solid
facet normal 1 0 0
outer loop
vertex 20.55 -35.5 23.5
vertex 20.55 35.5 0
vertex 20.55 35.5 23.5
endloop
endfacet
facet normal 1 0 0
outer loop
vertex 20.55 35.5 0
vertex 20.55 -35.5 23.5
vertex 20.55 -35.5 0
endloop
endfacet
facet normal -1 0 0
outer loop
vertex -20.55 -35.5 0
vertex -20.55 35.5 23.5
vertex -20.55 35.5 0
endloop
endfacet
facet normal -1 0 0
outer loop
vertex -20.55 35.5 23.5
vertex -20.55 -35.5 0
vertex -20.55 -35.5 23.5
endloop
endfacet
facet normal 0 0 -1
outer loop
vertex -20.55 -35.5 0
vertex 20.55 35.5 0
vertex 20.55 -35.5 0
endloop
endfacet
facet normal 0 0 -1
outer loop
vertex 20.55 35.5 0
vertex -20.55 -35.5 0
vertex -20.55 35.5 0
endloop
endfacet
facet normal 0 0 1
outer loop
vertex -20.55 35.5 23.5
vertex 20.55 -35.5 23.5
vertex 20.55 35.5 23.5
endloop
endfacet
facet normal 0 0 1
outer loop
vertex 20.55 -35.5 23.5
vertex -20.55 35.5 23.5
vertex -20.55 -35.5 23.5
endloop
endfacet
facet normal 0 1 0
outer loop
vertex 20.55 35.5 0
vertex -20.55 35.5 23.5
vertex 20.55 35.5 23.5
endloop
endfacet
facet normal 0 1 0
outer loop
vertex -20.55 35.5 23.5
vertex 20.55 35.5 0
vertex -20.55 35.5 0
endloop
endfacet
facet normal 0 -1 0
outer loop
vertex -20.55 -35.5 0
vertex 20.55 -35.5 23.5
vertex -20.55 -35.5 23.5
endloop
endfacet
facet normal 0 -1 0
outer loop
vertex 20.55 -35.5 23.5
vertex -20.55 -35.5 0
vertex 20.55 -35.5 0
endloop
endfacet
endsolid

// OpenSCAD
// file: values.scad
DEFAULT_ROUNDING = 24;
HIDEF_ROUNDING = 120;

SACRIFICIAL_BRIDGE_HEIGHT = .2;
BREAKAWAY_SUPPORT_DEPTH = .6;
BREAKAWAY_SUPPORT_GUTTER = 1;

PCB_WIDTH = 183.954;
PCB_LENGTH = 120.142;
PCB_HEIGHT = 1.6;
PCB_MOUNT_HOLE_DIAMETER = 3.2;

PCB_BATTERY_CAVITY_X = 135.382;
PCB_BATTERY_CAVITY_Y = 54.102;
PCB_BATTERY_CAVITY_LENGTH = PCB_LENGTH - PCB_BATTERY_CAVITY_Y + 1;

PCB_COMPONENTS_X = 2.54;
PCB_COMPONENTS_Y = 33.528;
PCB_COMPONENTS_WIDTH = PCB_BATTERY_CAVITY_X - PCB_COMPONENTS_X - 2.54 * 2;
PCB_COMPONENTS_LENGTH = PCB_LENGTH - PCB_COMPONENTS_Y - 2.54;
PCB_COMPONENTS_HEIGHT = 12;

PCB_SWITCH_X = 168.148;
PCB_SWITCH_Y = 9.148;

BUTTON_DIAMETER = 6;
BUTTON_LENGTH = 6.6;
BUTTON_WIDTH = 4.5;
BUTTON_HEIGHT = 6;

POT_HEIGHT = 7.8;

TOP_MOUNTED_PCB_HOLES = [
    [8.164, 3.048],
    [46.264, 3.048],
    [64.044, 3.048],
    [137.704, 3.048],
    [119.924, 3.048],
    [175.804, 3.048],
];

BOTTOM_MOUNTED_PCB_HOLES = [
    [8.164, 27.94],
    [64.044, 27.94],
    [175.804, 27.94],
    [119.924, 27.94],
];

BACK_PCB_HOLES = [
    [26.416, 98.298],
    [108.712, 98.298],
];

WIRE_RELIEF_HOLES = [
    [172.466, 50.038],
    [164.338, 50.038],
];

PCB_HOLES = concat(
    TOP_MOUNTED_PCB_HOLES,
    BOTTOM_MOUNTED_PCB_HOLES,
    BACK_PCB_HOLES,
    WIRE_RELIEF_HOLES
);

PCB_BUTTONS = [
    [10.414, 14.224 - BUTTON_LENGTH],
    [18.034, 19.304 - BUTTON_LENGTH],
    [25.654, 14.224 - BUTTON_LENGTH],
    [33.274, 19.304 - BUTTON_LENGTH],
    [40.894, 14.224 - BUTTON_LENGTH],
    [48.514, 19.304 - BUTTON_LENGTH],
    [56.134, 14.224 - BUTTON_LENGTH],
    [71.374, 14.224 - BUTTON_LENGTH],
    [78.994, 19.304 - BUTTON_LENGTH],
    [86.614, 14.224 - BUTTON_LENGTH],
    [94.234, 19.304 - BUTTON_LENGTH],
    [101.854, 14.224 - BUTTON_LENGTH],
    [117.094, 14.224 - BUTTON_LENGTH],
    [124.714, 19.304 - BUTTON_LENGTH],
    [132.334, 14.224 - BUTTON_LENGTH],
    [139.954, 19.304 - BUTTON_LENGTH],
    [147.574, 14.224 - BUTTON_LENGTH],
    [155.194, 19.304 - BUTTON_LENGTH],
    [162.814, 14.224 - BUTTON_LENGTH],
    [178.054, 14.224 - BUTTON_LENGTH],
];

PCB_VOLUME_WHEEL_X = 179.578;
PCB_VOLUME_WHEEL_Y = 42.164;

SCREW_HEAD_DIAMETER = 6;
SCREW_HEAD_HEIGHT = 2.1;
NUT_DIAMETER = 6.4;
NUT_HEIGHT = 2.4;

MOUNT_STILT_MINIMUM_HEIGHT = NUT_HEIGHT + .5 + 2; // TODO: tidy against mount_stilt args

NATURAL_KEY_SEQUENCES = [
    [1,0,1,0,1,1,0,1,0,1,0,1,],
    [0,1,0,1,1,0,1,0,1,0,1,1,],
    [1,0,1,1,0,1,0,1,0,1,1,0,],
    [0,1,1,0,1,0,1,0,1,1,0,1,],
    [1,1,0,1,0,1,0,1,1,0,1,0,],
    [1,0,1,0,1,0,1,1,0,1,0,1,],
    [0,1,0,1,0,1,1,0,1,0,1,1,],
    [1,0,1,0,1,1,0,1,0,1,1,0,],
    [0,1,0,1,1,0,1,0,1,1,0,1,],
    [1,0,1,1,0,1,0,1,1,0,1,0,],
    [0,1,1,0,1,0,1,1,0,1,0,1,],
    [1,1,0,1,0,1,1,0,1,0,1,0,],
];

HINGE_CLASP_DEFAULT_PIN_DIAMETER = 1.75; // filament diameter
HINGE_CLASP_DEFAULT_MINIMAL_SUPPORT = 1.5;
HINGE_CLASP_MINIMUM_TOOTH_WIDTH = 5;
HINGE_CLASP_MINIMUM_TOOTH_COUNT = 5;
HINGE_CLASP_MINIMUM_WIDTH = HINGE_CLASP_MINIMUM_TOOTH_WIDTH
    * HINGE_CLASP_MINIMUM_TOOTH_COUNT;
MINIMUM_HINGE_CLASP_LENGTH = 20;

HINGE_CLASP_SIDE_FRONT_BACK = 0;
HINGE_CLASP_SIDE_LEFT_RIGHT = 1;

LIP_BOX_DEFAULT_LIP_HEIGHT = 3;

BATTERY_WIDTH = 48;
BATTERY_LENGTH = 16.5;
BATTERY_HEIGHT = 27.5;
BATTERY_SNAP_WIDTH = 5;

/* S20X35VFS */
SPEAKER_DIAMETER = 41.1;
SPEAKER_HEIGHT = 23.5;
SPEAKER_LENGTH = 71;
SPEAKER_CLEARANCE = 2;
SPEAKER_PLATE_HOLE_DIAMETER = 3.6;
SPEAKER_PLATE_HOLE_XY = 4;
SPEAKER_PLATE_HEIGHT = .8;
SPEAKER_RIM_DEPTH = 3.8;
SPEAKER_RIM_HEIGHT = 1.4 - .4; // explicitly undersizing for good fit
SPEAKER_CONE_DIAMETER = 38;
SPEAKER_MAGNET_DIAMETER = 22;
SPEAKER_MAGNET_HEIGHT = 7.5;

/* https://www.ckswitches.com/media/1428/os.pdf */
SWITCH_BASE_WIDTH = 4.4;
SWITCH_BASE_LENGTH = 8.7;
SWITCH_BASE_HEIGHT = 4.5;
SWITCH_ACTUATOR_WIDTH = 2;
SWITCH_ACTUATOR_LENGTH = 2.1;
SWITCH_ACTUATOR_HEIGHT = 3.8;
SWITCH_ACTUATOR_TRAVEL = 1.5;
SWITCH_ORIGIN = [SWITCH_BASE_WIDTH / 2, 6.36];

PENCIL_STAND_CAVITY_DIAMETER = 8.5;

WINDOW_PANE_HEIGHT = 25.4 * 1 / 8;

HITCH_DEFAULT_MOUNT_SCREW_HEAD_CLEARANCE = .1;
HITCH_DEFAULT_SCREW_FLOOR = .4;
HITCH_RECOMMENDED_MINIMUM_CAVITY_HEIGHT = SCREW_HEAD_HEIGHT
    + HITCH_DEFAULT_MOUNT_SCREW_HEAD_CLEARANCE
    + HITCH_DEFAULT_SCREW_FLOOR
    + (SCREW_HEAD_DIAMETER - PCB_MOUNT_HOLE_DIAMETER) / 2;
// main file
include <values.scad>;

module speaker() {
    e = .095;

    module _hulls(
        d1 = SPEAKER_CONE_DIAMETER,
        d2 = SPEAKER_DIAMETER,
        h = e,
        z = SPEAKER_HEIGHT - SPEAKER_RIM_HEIGHT - SPEAKER_PLATE_HEIGHT - e
    ) {
        hull() {
            for (y = [
                SPEAKER_LENGTH / 2 - SPEAKER_DIAMETER / 2,
                SPEAKER_LENGTH / -2 + SPEAKER_DIAMETER / 2,
            ]) {
                translate([0, y, z]) {
                    cylinder(d1 = d1, d2 = d2, h = h);
                }
            }
        }
    }

    module _rim() {
        z = SPEAKER_HEIGHT - SPEAKER_RIM_HEIGHT;

        translate([0, 0, -e]) difference() {
            _hulls(
                d1 = SPEAKER_DIAMETER,
                d2 = SPEAKER_DIAMETER,
                h = SPEAKER_RIM_HEIGHT,
                z = z
            );

            _hulls(
                d1 = SPEAKER_DIAMETER - SPEAKER_RIM_DEPTH,
                d2 = SPEAKER_DIAMETER - SPEAKER_RIM_DEPTH,
                h = SPEAKER_RIM_HEIGHT + e * 2,
                z = z - e
            );
        }
    }

    module _plate() {
        translate([
            SPEAKER_DIAMETER / -2,
            SPEAKER_LENGTH / -2,
            SPEAKER_HEIGHT - SPEAKER_RIM_HEIGHT - SPEAKER_PLATE_HEIGHT
        ]) {
            difference() {
                cube([SPEAKER_DIAMETER, SPEAKER_LENGTH, SPEAKER_PLATE_HEIGHT]);

                for (xy = [
                    [SPEAKER_PLATE_HOLE_XY, SPEAKER_PLATE_HOLE_XY],
                    [SPEAKER_DIAMETER - SPEAKER_PLATE_HOLE_XY, SPEAKER_PLATE_HOLE_XY],
                    [SPEAKER_PLATE_HOLE_XY, SPEAKER_LENGTH - SPEAKER_PLATE_HOLE_XY],
                    [SPEAKER_DIAMETER - SPEAKER_PLATE_HOLE_XY, SPEAKER_LENGTH - SPEAKER_PLATE_HOLE_XY],
                ]) {
                    translate([xy.x, xy.y, -e]) {
                        cylinder(
                            d = SPEAKER_PLATE_HOLE_DIAMETER,
                            h = SPEAKER_PLATE_HEIGHT + e * 2
                        );
                    }
                }
            }
        }
    }

    module _cone() {
        hull() {
            _hulls();

            translate([0, 0, SPEAKER_MAGNET_HEIGHT]) {
                cylinder(d = SPEAKER_CONE_DIAMETER, h = e);
            }
        }
    }

    module _magnet() {
        cylinder(
            d = SPEAKER_MAGNET_DIAMETER,
            h = SPEAKER_MAGNET_HEIGHT
        );
    }

    _rim();
    % _plate();
    _cone();
    _magnet();
}

translate([SPEAKER_DIAMETER / -2, SPEAKER_LENGTH / -2, 0]) {
    # cube([SPEAKER_DIAMETER, SPEAKER_LENGTH, SPEAKER_HEIGHT]);
}

speaker();
